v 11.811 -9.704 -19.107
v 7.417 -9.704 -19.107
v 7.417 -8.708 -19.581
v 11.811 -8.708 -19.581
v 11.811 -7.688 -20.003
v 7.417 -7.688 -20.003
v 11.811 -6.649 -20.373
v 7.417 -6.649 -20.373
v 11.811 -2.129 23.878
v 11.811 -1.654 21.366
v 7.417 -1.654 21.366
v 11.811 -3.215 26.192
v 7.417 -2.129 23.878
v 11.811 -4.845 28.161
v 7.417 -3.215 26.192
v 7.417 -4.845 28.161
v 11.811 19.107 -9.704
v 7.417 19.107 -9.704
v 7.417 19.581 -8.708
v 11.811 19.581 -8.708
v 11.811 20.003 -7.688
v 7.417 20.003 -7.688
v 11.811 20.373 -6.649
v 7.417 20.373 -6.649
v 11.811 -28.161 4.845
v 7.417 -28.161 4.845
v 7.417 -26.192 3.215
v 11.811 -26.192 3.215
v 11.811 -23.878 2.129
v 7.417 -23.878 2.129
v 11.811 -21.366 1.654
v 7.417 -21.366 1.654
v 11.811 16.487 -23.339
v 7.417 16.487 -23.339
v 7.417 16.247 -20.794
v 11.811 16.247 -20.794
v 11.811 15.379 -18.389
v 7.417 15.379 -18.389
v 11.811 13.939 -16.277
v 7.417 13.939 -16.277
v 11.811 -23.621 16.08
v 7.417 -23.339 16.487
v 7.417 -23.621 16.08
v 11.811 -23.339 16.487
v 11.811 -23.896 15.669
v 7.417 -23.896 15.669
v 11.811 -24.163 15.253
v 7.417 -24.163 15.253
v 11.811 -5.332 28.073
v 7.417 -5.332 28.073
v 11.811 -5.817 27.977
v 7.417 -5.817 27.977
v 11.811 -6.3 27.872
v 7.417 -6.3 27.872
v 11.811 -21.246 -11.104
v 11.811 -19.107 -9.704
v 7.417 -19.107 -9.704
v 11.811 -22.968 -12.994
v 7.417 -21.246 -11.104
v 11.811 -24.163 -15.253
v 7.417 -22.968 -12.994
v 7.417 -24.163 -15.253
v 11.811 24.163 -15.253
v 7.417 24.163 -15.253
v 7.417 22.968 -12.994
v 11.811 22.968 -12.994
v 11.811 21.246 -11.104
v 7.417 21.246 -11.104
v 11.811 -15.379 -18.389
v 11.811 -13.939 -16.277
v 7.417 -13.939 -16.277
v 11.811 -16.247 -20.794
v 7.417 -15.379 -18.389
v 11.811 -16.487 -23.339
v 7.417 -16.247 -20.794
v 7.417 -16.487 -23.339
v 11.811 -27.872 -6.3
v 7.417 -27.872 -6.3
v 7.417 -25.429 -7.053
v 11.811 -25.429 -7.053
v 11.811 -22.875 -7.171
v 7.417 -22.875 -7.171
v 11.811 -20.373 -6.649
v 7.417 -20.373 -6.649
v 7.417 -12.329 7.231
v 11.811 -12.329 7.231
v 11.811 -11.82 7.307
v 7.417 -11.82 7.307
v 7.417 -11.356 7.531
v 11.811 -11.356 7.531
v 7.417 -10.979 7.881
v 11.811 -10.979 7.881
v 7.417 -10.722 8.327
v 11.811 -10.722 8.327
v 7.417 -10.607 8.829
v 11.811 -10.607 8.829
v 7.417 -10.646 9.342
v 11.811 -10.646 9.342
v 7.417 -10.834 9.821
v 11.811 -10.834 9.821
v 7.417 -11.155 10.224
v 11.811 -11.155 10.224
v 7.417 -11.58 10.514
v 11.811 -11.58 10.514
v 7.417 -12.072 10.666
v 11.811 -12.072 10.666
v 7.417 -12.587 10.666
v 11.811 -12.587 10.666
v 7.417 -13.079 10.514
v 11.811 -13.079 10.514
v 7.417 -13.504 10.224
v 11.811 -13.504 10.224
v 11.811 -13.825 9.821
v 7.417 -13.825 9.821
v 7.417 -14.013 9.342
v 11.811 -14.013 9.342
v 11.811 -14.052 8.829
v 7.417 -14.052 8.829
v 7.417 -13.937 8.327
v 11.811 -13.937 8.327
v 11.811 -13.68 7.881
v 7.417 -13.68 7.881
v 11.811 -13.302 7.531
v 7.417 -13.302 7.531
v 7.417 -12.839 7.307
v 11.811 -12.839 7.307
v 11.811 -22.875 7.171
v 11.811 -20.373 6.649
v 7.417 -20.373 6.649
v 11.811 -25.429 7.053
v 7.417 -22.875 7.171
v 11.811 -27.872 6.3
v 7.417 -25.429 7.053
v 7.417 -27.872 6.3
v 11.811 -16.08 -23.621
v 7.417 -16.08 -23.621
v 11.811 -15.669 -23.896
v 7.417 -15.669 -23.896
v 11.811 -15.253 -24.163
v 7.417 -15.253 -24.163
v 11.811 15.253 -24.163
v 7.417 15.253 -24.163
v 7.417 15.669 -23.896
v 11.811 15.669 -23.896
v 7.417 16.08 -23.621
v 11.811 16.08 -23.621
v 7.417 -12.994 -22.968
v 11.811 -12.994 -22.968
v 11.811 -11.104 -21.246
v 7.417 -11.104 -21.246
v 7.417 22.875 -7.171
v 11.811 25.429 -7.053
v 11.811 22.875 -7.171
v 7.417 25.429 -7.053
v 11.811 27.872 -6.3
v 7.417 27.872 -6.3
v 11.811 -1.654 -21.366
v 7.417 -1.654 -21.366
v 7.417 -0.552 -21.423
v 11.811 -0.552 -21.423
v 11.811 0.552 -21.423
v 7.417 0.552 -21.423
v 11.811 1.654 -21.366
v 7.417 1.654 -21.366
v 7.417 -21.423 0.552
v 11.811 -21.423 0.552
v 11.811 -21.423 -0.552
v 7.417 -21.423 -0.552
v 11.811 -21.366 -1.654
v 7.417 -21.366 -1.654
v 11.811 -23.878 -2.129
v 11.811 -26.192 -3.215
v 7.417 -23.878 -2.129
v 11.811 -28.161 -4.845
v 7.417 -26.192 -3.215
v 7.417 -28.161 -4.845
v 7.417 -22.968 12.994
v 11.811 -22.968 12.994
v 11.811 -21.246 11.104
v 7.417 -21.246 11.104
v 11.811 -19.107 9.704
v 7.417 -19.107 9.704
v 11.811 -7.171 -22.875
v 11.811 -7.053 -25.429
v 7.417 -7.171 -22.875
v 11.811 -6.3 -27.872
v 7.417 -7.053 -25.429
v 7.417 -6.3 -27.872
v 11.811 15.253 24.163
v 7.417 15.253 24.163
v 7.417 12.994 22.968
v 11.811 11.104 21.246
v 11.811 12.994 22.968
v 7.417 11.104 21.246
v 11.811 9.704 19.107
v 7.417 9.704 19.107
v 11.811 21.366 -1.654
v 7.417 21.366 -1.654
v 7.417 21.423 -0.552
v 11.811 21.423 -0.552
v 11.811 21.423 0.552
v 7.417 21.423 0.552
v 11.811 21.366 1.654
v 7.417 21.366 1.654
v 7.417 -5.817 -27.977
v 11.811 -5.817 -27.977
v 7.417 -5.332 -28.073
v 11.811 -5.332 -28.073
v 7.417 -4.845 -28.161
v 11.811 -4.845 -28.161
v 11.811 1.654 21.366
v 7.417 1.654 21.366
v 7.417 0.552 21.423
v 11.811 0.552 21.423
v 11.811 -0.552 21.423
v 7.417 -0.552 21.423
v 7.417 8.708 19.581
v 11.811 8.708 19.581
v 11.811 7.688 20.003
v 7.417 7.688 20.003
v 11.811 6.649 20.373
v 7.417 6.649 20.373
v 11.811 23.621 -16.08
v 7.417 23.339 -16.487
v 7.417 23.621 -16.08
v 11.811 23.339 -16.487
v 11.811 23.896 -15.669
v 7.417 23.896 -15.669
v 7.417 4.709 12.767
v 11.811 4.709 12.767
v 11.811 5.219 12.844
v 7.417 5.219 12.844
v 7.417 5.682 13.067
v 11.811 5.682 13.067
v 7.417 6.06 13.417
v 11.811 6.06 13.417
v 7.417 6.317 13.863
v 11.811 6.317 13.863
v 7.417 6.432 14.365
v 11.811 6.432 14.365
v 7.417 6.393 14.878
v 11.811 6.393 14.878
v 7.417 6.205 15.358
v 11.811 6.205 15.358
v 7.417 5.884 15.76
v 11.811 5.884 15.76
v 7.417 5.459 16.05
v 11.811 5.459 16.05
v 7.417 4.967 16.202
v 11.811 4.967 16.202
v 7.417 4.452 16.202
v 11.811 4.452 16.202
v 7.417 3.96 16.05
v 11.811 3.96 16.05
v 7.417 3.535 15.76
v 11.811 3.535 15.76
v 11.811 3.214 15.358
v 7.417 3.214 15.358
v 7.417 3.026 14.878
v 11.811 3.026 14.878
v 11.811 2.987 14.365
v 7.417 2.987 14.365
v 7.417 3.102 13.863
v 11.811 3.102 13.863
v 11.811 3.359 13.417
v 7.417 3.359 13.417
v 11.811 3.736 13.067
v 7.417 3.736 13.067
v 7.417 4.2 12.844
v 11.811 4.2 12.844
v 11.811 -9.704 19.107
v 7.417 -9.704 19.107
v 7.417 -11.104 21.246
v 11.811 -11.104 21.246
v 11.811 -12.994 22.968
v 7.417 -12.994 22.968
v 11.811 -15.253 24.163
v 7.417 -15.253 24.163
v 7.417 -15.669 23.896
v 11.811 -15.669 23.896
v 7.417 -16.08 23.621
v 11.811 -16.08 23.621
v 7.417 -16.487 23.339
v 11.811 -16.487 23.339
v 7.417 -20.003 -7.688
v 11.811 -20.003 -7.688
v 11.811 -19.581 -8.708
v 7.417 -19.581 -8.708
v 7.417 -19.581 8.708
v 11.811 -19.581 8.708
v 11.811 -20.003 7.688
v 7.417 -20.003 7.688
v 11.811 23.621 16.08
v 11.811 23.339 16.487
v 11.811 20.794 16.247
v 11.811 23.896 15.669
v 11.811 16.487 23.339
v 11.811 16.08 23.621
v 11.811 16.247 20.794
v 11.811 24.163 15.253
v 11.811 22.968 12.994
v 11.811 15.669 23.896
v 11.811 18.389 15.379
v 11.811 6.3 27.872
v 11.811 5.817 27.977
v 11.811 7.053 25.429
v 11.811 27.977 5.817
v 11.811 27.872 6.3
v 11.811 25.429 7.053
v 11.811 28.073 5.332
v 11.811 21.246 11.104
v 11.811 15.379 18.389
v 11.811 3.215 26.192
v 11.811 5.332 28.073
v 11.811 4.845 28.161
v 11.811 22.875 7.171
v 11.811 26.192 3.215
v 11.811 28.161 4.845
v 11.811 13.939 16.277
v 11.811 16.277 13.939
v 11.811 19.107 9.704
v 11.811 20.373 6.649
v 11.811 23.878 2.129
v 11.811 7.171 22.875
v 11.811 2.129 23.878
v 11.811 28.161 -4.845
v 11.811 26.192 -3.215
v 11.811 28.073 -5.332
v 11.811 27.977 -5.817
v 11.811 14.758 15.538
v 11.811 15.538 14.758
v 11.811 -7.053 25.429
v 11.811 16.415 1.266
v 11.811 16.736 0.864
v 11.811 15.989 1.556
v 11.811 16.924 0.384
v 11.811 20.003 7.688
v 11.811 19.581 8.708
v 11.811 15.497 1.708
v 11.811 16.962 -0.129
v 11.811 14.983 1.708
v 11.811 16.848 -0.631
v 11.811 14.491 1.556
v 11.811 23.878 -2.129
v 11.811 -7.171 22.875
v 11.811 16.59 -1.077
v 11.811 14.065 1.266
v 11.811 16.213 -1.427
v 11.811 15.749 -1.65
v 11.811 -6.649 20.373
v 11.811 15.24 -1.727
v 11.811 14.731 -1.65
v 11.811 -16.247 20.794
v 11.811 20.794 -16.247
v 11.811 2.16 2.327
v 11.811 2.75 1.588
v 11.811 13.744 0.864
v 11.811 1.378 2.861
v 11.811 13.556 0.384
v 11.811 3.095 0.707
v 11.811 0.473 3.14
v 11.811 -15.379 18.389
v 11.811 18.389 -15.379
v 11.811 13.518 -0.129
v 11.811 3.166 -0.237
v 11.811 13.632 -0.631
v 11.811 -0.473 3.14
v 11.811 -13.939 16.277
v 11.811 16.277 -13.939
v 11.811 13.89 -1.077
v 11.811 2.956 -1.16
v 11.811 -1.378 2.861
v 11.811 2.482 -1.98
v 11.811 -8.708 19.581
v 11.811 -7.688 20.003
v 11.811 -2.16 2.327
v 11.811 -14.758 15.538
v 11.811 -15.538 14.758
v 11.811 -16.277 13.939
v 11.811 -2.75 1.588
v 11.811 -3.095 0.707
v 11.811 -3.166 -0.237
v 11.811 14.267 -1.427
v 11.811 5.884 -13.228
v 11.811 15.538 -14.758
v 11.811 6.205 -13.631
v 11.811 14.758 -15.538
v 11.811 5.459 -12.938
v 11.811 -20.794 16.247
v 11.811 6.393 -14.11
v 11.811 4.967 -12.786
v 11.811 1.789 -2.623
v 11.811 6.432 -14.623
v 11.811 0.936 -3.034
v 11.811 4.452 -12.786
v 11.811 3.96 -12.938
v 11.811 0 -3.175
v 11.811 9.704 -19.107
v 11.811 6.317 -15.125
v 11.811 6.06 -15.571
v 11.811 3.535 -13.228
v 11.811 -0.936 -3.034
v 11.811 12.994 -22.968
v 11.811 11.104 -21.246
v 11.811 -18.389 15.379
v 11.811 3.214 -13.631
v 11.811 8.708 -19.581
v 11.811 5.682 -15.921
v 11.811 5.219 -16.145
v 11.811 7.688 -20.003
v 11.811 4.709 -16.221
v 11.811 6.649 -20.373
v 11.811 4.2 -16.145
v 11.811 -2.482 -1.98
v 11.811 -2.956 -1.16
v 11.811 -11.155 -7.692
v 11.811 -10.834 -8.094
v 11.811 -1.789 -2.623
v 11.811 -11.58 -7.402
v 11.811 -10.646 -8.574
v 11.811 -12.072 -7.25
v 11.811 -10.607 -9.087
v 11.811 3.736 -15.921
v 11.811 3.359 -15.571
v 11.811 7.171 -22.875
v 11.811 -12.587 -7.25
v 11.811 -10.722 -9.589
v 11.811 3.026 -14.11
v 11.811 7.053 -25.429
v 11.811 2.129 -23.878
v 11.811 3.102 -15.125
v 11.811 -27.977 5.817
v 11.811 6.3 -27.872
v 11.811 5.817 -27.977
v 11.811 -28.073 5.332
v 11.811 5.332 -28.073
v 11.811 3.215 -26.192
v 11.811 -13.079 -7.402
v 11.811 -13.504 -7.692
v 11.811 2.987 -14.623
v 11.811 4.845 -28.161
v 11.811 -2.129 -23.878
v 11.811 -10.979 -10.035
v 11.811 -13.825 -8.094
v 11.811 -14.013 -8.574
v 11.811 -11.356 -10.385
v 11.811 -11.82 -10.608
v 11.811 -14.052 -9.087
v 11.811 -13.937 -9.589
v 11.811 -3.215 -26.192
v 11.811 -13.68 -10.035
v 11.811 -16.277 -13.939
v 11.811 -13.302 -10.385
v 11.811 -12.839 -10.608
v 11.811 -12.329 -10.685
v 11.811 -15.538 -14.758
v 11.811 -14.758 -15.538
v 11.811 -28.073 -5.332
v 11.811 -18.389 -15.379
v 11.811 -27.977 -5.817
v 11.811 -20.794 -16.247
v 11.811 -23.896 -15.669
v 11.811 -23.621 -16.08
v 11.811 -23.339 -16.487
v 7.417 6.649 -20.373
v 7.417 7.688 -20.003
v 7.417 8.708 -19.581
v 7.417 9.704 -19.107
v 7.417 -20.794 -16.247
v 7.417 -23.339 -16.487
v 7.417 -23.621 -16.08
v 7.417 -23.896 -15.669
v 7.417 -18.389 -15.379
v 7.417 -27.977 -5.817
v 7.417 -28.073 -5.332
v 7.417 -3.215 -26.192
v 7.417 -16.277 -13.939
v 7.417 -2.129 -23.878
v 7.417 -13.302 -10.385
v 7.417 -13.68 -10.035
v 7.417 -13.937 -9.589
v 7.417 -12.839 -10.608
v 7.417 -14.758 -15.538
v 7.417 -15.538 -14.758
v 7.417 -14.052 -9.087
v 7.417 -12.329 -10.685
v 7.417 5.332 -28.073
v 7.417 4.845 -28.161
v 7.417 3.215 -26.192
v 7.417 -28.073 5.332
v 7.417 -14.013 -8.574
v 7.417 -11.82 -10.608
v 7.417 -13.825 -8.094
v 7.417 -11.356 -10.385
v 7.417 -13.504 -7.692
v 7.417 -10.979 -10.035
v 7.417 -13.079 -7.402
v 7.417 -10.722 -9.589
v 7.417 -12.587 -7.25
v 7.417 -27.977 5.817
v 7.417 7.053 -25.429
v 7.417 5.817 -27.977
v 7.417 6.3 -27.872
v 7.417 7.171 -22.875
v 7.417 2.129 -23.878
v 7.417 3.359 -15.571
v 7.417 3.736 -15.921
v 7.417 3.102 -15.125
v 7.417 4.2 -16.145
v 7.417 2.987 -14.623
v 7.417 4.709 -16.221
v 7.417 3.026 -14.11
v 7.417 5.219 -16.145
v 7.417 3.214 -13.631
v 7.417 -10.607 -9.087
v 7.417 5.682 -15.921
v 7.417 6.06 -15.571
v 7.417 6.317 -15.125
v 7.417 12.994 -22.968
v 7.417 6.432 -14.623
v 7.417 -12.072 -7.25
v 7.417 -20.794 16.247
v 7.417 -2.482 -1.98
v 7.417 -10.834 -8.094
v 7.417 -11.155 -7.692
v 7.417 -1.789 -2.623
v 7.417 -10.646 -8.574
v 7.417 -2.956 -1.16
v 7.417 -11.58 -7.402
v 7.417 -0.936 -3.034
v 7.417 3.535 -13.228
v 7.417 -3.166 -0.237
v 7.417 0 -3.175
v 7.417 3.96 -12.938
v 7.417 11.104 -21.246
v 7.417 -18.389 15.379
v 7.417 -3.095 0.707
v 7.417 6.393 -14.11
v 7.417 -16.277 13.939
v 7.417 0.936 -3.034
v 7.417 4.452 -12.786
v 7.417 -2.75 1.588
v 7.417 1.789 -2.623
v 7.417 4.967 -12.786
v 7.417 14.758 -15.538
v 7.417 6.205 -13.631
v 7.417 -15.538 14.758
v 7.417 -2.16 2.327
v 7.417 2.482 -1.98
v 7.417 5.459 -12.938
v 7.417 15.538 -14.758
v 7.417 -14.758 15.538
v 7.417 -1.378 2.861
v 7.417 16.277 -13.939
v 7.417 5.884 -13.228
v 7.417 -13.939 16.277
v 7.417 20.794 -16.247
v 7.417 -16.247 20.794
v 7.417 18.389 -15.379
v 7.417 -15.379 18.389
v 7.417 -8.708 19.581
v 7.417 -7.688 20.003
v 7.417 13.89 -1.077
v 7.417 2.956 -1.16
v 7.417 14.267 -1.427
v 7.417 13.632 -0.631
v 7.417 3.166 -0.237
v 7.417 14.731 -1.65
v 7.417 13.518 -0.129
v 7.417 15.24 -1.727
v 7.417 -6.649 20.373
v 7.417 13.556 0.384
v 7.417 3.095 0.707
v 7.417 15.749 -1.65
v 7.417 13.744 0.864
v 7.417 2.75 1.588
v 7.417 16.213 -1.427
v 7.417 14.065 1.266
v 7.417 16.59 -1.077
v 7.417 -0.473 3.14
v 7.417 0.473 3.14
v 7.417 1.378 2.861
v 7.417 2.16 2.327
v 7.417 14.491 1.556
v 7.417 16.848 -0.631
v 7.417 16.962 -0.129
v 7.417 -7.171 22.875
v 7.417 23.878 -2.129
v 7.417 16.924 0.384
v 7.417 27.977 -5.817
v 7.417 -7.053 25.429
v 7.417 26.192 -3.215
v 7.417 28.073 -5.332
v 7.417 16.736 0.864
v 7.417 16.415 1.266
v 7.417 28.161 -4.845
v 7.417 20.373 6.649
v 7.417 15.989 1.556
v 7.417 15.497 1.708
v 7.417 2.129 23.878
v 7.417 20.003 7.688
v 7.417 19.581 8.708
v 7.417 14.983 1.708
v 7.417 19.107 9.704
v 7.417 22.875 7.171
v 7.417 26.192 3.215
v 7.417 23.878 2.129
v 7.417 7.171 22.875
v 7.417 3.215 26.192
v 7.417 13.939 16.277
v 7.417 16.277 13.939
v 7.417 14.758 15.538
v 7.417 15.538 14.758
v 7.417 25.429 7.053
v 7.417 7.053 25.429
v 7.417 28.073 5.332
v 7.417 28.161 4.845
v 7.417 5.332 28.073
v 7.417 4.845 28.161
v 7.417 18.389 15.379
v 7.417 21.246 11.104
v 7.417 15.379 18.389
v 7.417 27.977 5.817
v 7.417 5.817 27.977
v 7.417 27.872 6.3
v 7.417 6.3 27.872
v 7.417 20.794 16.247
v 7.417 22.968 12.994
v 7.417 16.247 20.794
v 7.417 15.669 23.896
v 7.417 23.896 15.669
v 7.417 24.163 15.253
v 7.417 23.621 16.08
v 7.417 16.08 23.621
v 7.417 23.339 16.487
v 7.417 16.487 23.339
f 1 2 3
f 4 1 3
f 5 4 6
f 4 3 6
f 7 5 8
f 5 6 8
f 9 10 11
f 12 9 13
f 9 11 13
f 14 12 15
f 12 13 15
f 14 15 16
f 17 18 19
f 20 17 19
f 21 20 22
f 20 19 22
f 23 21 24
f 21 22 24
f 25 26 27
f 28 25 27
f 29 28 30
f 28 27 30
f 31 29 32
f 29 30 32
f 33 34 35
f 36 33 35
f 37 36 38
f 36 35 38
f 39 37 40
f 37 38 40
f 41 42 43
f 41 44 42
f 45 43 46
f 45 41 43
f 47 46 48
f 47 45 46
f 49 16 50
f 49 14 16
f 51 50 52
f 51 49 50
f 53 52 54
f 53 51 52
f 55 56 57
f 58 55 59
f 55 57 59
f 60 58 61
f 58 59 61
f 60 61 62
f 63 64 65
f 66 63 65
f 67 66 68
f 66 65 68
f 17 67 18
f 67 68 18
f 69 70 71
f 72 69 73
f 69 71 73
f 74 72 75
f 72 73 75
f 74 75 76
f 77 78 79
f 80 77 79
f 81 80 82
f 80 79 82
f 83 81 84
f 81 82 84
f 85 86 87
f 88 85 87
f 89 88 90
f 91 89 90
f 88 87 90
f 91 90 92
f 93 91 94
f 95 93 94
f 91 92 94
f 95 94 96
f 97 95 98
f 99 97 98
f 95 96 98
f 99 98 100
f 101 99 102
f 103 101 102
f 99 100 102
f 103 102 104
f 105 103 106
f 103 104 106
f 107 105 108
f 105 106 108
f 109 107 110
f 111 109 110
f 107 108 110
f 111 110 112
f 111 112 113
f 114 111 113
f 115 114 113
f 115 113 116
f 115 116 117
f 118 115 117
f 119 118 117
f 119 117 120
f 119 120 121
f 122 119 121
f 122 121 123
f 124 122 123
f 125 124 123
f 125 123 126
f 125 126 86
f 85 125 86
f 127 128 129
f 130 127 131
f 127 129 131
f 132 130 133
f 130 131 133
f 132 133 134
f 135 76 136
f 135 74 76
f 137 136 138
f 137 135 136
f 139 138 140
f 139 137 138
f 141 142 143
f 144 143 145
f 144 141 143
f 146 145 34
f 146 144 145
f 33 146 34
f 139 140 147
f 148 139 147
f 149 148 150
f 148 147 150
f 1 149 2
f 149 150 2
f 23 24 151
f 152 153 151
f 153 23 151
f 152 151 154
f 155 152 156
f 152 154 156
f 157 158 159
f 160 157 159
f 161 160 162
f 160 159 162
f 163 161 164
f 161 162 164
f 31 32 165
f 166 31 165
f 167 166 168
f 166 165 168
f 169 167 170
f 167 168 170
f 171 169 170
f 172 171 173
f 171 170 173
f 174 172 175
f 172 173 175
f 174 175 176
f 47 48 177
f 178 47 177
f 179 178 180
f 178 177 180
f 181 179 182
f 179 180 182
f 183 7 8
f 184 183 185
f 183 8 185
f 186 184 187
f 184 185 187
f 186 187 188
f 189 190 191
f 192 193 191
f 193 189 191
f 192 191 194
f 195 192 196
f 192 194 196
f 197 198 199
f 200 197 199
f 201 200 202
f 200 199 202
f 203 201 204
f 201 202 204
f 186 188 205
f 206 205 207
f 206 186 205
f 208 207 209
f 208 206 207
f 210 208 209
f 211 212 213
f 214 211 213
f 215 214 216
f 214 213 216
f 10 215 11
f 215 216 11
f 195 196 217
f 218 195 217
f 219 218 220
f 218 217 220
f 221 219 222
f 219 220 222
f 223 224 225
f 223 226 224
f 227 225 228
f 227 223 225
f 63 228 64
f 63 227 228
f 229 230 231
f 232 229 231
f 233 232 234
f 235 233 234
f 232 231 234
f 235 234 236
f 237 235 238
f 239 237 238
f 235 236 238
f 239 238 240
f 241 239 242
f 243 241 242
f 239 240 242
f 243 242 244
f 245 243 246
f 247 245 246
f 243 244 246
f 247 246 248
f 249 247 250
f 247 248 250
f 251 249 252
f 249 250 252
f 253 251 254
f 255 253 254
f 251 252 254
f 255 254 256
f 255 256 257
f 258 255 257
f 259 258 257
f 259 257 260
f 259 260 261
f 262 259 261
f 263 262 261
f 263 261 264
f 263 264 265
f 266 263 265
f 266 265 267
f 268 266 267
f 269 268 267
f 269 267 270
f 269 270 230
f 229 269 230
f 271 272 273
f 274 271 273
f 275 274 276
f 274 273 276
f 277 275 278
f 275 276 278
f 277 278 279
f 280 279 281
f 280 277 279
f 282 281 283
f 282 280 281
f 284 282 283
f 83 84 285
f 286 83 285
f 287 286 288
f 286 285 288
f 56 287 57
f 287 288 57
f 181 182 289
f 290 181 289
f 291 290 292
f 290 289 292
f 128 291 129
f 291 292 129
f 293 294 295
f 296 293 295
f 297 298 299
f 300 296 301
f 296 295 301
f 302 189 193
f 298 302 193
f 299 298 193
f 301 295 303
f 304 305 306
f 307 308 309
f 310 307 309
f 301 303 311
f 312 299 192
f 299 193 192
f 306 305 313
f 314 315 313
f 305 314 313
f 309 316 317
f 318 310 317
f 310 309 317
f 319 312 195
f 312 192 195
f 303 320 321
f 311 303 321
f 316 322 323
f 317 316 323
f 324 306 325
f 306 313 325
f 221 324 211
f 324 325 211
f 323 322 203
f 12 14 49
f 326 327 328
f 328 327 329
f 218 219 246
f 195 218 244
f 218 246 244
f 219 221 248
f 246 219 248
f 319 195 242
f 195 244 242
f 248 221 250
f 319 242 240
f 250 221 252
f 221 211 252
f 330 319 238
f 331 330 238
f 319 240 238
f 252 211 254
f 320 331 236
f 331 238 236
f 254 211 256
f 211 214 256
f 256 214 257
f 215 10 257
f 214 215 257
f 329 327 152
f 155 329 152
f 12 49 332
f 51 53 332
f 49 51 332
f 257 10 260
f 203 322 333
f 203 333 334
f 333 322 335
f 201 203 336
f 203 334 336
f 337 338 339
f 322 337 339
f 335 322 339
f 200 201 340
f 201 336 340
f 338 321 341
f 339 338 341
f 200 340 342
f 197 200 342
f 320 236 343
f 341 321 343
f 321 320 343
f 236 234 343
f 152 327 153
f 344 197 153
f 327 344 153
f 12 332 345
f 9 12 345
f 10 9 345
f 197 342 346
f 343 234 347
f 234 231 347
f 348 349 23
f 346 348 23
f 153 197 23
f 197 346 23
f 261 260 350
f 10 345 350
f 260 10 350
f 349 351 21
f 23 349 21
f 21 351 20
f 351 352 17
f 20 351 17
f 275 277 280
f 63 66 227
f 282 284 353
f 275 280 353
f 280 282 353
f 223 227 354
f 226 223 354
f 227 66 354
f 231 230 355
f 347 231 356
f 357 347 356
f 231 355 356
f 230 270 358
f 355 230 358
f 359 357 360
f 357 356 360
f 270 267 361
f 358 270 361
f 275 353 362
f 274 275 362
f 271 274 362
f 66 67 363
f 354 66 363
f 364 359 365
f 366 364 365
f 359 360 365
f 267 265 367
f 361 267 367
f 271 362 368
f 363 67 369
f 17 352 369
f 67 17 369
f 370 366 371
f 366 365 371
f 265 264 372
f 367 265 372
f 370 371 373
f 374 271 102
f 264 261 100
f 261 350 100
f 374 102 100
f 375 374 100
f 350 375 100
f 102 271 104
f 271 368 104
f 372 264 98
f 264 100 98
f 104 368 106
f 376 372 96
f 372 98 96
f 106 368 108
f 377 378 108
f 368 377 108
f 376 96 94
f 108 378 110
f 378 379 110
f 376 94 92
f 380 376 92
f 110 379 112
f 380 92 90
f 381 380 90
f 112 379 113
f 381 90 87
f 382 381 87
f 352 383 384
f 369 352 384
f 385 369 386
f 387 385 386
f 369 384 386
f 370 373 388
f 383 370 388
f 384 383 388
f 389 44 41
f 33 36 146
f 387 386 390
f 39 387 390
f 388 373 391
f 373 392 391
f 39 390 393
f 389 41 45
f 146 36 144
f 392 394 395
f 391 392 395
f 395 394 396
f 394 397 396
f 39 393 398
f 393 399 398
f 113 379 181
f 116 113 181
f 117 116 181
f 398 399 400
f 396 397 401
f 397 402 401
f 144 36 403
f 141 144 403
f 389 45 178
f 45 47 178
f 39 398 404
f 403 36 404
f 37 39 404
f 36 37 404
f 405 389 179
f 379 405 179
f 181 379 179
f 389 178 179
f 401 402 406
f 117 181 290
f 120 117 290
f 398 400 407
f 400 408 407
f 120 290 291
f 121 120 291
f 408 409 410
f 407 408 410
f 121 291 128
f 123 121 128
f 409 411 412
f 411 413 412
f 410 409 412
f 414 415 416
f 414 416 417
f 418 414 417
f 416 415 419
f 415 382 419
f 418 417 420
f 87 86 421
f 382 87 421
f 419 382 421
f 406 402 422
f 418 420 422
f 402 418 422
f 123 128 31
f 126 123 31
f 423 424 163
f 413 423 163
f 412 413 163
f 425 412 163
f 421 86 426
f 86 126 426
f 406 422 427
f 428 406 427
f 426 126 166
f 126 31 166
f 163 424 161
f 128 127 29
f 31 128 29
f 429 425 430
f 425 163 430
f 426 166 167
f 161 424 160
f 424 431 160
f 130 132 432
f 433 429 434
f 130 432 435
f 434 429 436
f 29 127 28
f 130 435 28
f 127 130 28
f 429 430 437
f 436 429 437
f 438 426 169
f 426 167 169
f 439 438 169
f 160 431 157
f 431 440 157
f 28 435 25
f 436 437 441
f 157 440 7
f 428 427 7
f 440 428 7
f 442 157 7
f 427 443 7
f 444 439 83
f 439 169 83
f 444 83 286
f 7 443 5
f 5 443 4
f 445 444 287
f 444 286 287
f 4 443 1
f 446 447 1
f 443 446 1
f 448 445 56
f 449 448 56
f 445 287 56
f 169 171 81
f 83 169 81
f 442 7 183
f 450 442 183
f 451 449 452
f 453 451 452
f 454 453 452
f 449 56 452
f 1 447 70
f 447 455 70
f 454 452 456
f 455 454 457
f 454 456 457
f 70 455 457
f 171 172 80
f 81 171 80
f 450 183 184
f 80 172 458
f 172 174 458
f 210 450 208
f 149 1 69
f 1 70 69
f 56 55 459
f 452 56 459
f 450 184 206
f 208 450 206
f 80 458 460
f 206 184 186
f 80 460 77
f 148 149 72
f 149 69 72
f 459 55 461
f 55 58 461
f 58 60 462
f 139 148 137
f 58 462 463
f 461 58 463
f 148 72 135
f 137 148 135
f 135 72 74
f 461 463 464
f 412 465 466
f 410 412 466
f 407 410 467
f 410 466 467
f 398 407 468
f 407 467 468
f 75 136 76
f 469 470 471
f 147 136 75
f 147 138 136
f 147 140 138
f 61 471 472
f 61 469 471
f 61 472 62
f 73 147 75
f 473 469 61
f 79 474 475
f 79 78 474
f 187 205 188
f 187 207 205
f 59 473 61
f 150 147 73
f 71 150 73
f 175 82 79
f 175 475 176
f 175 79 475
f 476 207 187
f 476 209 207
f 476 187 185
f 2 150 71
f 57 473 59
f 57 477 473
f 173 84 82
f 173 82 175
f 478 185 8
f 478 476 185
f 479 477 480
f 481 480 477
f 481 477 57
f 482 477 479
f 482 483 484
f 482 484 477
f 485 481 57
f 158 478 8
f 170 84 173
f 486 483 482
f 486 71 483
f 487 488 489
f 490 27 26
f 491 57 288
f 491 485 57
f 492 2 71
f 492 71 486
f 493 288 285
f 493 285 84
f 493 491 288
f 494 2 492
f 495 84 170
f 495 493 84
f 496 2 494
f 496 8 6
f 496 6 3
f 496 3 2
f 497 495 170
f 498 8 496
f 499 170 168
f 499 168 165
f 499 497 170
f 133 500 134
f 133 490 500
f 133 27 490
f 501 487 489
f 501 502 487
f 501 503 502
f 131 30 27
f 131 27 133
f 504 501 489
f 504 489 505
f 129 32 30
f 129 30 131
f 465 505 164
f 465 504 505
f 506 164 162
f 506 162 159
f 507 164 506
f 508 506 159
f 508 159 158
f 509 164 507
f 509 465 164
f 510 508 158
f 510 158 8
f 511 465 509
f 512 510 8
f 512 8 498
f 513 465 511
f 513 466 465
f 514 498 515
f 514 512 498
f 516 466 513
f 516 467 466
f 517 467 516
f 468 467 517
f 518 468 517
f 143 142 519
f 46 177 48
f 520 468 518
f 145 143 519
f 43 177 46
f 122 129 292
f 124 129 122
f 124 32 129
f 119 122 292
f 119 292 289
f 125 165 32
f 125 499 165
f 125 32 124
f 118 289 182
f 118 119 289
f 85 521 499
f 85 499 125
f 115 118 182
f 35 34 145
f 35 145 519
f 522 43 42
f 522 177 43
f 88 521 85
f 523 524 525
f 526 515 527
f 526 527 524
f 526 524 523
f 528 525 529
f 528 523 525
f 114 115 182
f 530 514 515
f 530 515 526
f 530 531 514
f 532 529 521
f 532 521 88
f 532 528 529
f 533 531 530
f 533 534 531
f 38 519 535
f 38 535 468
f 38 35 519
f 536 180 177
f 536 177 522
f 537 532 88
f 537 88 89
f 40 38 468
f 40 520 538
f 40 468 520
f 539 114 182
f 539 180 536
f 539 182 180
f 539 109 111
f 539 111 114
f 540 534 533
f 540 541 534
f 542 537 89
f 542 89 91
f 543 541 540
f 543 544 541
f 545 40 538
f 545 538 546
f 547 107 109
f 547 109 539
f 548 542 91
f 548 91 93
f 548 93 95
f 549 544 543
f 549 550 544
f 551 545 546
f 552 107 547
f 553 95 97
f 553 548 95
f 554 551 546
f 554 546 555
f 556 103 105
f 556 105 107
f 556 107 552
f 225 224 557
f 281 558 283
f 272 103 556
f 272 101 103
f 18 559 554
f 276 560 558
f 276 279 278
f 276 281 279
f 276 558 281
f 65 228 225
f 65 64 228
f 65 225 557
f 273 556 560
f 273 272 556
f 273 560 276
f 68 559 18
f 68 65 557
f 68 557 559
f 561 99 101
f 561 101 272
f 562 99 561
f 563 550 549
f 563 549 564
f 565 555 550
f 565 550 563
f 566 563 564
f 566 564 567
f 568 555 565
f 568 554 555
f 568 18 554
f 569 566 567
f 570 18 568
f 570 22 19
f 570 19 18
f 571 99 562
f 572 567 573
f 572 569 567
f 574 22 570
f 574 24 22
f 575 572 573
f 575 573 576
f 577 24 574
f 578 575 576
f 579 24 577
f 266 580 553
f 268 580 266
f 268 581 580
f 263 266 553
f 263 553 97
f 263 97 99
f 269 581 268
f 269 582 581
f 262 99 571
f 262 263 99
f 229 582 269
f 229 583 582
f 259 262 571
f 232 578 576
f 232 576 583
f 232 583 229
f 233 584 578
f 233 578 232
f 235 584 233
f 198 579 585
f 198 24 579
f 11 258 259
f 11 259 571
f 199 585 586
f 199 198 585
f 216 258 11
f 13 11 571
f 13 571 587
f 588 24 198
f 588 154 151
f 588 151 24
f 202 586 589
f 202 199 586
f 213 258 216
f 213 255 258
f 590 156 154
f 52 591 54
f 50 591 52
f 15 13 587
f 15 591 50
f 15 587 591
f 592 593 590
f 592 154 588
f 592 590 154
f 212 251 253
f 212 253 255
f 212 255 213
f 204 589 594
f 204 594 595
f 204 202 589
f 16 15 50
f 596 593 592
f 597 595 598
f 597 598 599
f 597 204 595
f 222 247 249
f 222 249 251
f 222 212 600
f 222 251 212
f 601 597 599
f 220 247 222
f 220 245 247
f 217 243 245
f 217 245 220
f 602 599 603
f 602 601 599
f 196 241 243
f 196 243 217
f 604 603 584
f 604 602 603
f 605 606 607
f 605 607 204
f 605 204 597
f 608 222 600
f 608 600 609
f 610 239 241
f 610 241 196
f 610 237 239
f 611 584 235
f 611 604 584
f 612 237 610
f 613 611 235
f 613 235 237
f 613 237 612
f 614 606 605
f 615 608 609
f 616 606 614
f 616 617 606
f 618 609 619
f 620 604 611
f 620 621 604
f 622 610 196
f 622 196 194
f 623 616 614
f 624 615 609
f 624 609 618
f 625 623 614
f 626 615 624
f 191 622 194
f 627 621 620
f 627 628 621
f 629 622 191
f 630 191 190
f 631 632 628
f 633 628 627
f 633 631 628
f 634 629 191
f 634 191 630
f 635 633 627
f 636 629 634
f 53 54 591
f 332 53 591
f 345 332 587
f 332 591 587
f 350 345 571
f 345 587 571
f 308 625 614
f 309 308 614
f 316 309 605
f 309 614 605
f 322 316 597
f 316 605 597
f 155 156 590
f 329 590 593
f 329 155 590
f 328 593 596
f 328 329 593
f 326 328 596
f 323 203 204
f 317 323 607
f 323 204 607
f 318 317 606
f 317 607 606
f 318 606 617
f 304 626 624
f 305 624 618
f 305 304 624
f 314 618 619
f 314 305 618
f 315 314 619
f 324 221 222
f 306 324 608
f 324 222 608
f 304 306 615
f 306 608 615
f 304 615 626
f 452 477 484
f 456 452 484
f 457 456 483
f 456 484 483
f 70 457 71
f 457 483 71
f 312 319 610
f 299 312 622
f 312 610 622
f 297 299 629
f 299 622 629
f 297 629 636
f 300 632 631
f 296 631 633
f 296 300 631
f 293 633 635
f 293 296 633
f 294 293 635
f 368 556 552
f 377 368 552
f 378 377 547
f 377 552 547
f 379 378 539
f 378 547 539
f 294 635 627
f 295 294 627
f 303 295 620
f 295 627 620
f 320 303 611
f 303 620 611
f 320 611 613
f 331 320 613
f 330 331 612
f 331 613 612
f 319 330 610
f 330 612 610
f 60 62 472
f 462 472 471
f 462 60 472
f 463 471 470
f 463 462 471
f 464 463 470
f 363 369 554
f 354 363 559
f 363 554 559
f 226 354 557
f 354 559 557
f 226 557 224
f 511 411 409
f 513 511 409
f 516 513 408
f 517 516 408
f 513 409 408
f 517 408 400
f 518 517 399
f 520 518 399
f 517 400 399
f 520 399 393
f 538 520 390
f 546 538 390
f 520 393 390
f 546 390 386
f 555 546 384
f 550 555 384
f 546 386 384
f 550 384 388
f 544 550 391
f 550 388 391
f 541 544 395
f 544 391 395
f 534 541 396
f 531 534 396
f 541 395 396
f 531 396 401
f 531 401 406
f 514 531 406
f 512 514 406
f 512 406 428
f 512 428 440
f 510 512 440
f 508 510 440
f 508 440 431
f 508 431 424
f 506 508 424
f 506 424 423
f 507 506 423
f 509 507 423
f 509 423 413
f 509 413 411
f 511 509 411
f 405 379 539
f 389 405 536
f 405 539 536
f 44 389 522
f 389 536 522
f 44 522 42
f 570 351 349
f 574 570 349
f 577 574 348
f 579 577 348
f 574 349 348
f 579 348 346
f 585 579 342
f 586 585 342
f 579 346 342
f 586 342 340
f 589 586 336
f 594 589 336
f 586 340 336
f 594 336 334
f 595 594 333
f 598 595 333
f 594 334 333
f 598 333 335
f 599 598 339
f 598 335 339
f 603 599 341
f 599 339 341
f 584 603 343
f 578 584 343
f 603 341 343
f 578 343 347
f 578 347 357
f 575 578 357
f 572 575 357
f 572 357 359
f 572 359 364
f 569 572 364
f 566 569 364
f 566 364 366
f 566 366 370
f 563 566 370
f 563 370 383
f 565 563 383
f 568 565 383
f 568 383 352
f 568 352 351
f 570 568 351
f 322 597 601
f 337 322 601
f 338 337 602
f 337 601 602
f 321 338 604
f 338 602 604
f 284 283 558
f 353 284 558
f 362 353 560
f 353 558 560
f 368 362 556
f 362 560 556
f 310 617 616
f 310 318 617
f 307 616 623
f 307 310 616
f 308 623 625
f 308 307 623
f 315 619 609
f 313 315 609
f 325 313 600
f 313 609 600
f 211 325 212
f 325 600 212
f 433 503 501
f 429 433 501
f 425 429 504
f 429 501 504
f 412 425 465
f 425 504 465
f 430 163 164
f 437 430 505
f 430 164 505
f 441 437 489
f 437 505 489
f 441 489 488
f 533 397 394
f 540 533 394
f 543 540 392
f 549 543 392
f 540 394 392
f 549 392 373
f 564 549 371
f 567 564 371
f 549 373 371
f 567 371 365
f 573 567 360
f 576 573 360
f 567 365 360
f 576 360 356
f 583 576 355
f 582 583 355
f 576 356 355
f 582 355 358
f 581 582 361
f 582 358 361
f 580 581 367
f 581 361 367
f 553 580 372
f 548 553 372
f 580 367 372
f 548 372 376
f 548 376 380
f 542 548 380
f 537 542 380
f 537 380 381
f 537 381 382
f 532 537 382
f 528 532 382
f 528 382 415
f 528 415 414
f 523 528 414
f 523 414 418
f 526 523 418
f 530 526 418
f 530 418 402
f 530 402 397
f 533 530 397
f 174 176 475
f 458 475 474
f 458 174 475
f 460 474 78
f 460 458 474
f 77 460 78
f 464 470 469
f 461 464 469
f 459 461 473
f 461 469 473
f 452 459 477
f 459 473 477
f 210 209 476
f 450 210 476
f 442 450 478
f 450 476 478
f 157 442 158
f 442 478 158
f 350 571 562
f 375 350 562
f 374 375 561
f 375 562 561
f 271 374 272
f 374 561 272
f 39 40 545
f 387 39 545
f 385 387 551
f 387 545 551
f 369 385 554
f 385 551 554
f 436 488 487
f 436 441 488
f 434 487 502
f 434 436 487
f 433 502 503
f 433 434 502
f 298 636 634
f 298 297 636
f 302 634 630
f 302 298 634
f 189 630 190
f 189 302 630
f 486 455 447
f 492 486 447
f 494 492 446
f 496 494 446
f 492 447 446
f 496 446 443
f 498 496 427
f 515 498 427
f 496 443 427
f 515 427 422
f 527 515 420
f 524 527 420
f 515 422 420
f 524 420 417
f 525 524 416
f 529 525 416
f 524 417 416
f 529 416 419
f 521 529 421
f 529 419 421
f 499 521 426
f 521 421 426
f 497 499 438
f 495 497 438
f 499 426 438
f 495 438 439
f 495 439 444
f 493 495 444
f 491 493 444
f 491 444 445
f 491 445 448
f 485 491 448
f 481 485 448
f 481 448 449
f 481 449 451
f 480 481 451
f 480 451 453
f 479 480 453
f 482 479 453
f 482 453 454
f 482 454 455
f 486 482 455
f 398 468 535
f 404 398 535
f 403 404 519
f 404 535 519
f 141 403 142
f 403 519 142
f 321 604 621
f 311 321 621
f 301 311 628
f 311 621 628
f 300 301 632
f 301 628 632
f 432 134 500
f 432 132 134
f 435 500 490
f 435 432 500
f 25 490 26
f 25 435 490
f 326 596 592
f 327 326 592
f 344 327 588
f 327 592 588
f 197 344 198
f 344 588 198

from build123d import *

# Parameters (mm, degrees)
BASPROSKE_W        = 11.811
BASPROSKE_H        = 28.575
TOOTHCUT_DEPTH     = 43.101792967
TEETHCUTS_COUNT    = 16
TEETHCUTS_ANGLE    = 337.5
BORSKE_R           = 0.396875
BORE_DEPTH         = 50.8000508
SKETCH1_R          = 3.175
CUT_EXTRUDE1_DEPTH = 42.540449503
SKETCH2_R          = 1.7272
CUT_EXTRUDE2_DEPTH = 42.540449503
SKETCH3_W          = 84.477604546
SKETCH3_H          = 60.621692784
CUT_EXTRUDE3_DEPTH = 7.4168


with BuildPart() as part:
    # BasProSke → Base-Revolve (revolve)
    with BuildSketch(Plane(origin=(0, 0, 0), x_dir=(1, 0, 0), z_dir=(0, 1, 0)), mode=Mode.PRIVATE) as base_revolve_sk:
        with Locations((5.9055, 14.2875)):
            Rectangle(BASPROSKE_W, BASPROSKE_H)
    revolve(base_revolve_sk.sketch.rotate(Axis((-10, 0, 0), (1, 0, 0)), 180), axis=Axis((-10, 0, 0), (1, 0, 0)))

    # TooCutSke → ToothCut (cut, through all)
    with BuildSketch(Plane(origin=(0, 0, 0), x_dir=(0, 0, -1), z_dir=(1, 0, 0))):
        with BuildLine():
            ThreePointArc((1.653773222, 21.366073035), (0, 21.42998), (-1.653773222, 21.366073035))
            ThreePointArc((-1.653773222, 21.366073035), (-2.605634946, 25.083646688), (-4.868483936, 28.182986789))
            ThreePointArc((-4.868483936, 28.182986789), (0, 28.6004), (4.868483936, 28.182986789))
            ThreePointArc((4.868483936, 28.182986789), (2.605634946, 25.083646688), (1.653773222, 21.366073035))
        make_face()
    toothcut = extrude(amount=TOOTHCUT_DEPTH, mode=Mode.SUBTRACT)

    # TeethCuts: ToothCut ×16 about axis
    teethcuts_axis = Axis((-10, 0, 0), (1, 0, 0))
    for i in range(1, TEETHCUTS_COUNT):
        add(toothcut.rotate(teethcuts_axis, i * TEETHCUTS_ANGLE / (TEETHCUTS_COUNT - 1)), mode=Mode.SUBTRACT)

    # BorSke → Bore (cut, symmetric)
    with BuildSketch(Plane(origin=(0, 0, 0), x_dir=(0, 0, -1), z_dir=(1, 0, 0))):
        with Locations(Location((0, 0, 0), (0, 0, 180))):
            Circle(BORSKE_R)
    extrude(amount=BORE_DEPTH, both=True, mode=Mode.SUBTRACT)

    # Sketch1 → Cut-Extrude1 (cut, through all)
    with BuildSketch(Plane(origin=(11.811, 0, 0), x_dir=(0, 0, -1), z_dir=(1, 0, 0))):
        Circle(SKETCH1_R)
    extrude(amount=-CUT_EXTRUDE1_DEPTH, mode=Mode.SUBTRACT)

    # Sketch2 → Cut-Extrude2 (cut, through all)
    with BuildSketch(Plane(origin=(11.811, 0, 0), x_dir=(0, 0, -1), z_dir=(1, 0, 0))):
        with Locations((0, 15.24)):
            Circle(SKETCH2_R)
        with Locations((14.494101308, 4.709418994)):
            Circle(SKETCH2_R)
        with Locations((8.957847245, -12.329418994)):
            Circle(SKETCH2_R)
        with Locations((-8.957847245, -12.329418994)):
            Circle(SKETCH2_R)
        with Locations((-14.494101308, 4.709418994)):
            Circle(SKETCH2_R)
    extrude(amount=-CUT_EXTRUDE2_DEPTH, mode=Mode.SUBTRACT)

    # Sketch3 → Cut-Extrude3 (cut)
    with BuildSketch(Plane.ZY):
        with Locations((1.281804372, -1.088129041)):
            Rectangle(SKETCH3_W, SKETCH3_H)
    extrude(amount=-CUT_EXTRUDE3_DEPTH, mode=Mode.SUBTRACT)


solid = part.part
